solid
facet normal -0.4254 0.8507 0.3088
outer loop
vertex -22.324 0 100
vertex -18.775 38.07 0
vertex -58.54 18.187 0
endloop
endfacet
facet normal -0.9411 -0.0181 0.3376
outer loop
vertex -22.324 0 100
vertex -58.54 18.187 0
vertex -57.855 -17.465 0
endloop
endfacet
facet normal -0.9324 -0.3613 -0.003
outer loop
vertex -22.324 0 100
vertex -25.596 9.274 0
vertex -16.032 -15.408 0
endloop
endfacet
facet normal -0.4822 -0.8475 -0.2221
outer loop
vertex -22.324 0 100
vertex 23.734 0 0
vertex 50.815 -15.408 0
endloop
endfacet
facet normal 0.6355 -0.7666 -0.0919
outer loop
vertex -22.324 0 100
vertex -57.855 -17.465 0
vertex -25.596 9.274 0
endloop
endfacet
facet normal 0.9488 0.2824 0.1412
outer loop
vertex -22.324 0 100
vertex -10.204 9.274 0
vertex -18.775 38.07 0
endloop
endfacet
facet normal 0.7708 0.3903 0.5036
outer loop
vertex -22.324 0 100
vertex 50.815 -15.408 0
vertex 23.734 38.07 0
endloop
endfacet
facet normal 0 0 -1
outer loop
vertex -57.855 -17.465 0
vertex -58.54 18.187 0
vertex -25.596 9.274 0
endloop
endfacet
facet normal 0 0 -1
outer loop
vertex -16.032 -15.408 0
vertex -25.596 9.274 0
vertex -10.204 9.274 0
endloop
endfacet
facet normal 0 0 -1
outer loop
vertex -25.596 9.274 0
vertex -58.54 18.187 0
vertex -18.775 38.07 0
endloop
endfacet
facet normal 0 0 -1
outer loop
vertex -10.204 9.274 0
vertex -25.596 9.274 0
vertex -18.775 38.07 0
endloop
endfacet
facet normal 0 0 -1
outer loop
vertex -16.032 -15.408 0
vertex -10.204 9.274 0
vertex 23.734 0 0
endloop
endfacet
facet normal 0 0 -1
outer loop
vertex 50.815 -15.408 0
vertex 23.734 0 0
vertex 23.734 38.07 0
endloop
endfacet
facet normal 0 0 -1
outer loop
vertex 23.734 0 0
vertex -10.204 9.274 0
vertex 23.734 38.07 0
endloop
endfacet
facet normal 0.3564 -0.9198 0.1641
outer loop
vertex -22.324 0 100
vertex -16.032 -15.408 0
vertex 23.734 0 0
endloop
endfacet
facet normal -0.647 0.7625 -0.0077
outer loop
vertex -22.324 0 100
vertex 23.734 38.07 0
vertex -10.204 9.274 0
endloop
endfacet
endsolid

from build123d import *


with BuildPart() as f3:
    # F0 (on Top) → F3 section 0
    with BuildSketch(Plane.XY, mode=Mode.PRIVATE) as f3_s0:
        Polygon((-58.540445, 18.186722), (-57.854831, -17.46534), (-25.596111, 9.273707), (-16.032221, -15.40849), (23.73354, 0), (50.815396, -15.40849), (23.73354, 38.069602), (-10.20448, 9.273707), (-18.774686, 38.069602), align=None)
    loft([f3_s0.sketch, Vertex(-22.32356, 0, 100)])


solid = f3.part
